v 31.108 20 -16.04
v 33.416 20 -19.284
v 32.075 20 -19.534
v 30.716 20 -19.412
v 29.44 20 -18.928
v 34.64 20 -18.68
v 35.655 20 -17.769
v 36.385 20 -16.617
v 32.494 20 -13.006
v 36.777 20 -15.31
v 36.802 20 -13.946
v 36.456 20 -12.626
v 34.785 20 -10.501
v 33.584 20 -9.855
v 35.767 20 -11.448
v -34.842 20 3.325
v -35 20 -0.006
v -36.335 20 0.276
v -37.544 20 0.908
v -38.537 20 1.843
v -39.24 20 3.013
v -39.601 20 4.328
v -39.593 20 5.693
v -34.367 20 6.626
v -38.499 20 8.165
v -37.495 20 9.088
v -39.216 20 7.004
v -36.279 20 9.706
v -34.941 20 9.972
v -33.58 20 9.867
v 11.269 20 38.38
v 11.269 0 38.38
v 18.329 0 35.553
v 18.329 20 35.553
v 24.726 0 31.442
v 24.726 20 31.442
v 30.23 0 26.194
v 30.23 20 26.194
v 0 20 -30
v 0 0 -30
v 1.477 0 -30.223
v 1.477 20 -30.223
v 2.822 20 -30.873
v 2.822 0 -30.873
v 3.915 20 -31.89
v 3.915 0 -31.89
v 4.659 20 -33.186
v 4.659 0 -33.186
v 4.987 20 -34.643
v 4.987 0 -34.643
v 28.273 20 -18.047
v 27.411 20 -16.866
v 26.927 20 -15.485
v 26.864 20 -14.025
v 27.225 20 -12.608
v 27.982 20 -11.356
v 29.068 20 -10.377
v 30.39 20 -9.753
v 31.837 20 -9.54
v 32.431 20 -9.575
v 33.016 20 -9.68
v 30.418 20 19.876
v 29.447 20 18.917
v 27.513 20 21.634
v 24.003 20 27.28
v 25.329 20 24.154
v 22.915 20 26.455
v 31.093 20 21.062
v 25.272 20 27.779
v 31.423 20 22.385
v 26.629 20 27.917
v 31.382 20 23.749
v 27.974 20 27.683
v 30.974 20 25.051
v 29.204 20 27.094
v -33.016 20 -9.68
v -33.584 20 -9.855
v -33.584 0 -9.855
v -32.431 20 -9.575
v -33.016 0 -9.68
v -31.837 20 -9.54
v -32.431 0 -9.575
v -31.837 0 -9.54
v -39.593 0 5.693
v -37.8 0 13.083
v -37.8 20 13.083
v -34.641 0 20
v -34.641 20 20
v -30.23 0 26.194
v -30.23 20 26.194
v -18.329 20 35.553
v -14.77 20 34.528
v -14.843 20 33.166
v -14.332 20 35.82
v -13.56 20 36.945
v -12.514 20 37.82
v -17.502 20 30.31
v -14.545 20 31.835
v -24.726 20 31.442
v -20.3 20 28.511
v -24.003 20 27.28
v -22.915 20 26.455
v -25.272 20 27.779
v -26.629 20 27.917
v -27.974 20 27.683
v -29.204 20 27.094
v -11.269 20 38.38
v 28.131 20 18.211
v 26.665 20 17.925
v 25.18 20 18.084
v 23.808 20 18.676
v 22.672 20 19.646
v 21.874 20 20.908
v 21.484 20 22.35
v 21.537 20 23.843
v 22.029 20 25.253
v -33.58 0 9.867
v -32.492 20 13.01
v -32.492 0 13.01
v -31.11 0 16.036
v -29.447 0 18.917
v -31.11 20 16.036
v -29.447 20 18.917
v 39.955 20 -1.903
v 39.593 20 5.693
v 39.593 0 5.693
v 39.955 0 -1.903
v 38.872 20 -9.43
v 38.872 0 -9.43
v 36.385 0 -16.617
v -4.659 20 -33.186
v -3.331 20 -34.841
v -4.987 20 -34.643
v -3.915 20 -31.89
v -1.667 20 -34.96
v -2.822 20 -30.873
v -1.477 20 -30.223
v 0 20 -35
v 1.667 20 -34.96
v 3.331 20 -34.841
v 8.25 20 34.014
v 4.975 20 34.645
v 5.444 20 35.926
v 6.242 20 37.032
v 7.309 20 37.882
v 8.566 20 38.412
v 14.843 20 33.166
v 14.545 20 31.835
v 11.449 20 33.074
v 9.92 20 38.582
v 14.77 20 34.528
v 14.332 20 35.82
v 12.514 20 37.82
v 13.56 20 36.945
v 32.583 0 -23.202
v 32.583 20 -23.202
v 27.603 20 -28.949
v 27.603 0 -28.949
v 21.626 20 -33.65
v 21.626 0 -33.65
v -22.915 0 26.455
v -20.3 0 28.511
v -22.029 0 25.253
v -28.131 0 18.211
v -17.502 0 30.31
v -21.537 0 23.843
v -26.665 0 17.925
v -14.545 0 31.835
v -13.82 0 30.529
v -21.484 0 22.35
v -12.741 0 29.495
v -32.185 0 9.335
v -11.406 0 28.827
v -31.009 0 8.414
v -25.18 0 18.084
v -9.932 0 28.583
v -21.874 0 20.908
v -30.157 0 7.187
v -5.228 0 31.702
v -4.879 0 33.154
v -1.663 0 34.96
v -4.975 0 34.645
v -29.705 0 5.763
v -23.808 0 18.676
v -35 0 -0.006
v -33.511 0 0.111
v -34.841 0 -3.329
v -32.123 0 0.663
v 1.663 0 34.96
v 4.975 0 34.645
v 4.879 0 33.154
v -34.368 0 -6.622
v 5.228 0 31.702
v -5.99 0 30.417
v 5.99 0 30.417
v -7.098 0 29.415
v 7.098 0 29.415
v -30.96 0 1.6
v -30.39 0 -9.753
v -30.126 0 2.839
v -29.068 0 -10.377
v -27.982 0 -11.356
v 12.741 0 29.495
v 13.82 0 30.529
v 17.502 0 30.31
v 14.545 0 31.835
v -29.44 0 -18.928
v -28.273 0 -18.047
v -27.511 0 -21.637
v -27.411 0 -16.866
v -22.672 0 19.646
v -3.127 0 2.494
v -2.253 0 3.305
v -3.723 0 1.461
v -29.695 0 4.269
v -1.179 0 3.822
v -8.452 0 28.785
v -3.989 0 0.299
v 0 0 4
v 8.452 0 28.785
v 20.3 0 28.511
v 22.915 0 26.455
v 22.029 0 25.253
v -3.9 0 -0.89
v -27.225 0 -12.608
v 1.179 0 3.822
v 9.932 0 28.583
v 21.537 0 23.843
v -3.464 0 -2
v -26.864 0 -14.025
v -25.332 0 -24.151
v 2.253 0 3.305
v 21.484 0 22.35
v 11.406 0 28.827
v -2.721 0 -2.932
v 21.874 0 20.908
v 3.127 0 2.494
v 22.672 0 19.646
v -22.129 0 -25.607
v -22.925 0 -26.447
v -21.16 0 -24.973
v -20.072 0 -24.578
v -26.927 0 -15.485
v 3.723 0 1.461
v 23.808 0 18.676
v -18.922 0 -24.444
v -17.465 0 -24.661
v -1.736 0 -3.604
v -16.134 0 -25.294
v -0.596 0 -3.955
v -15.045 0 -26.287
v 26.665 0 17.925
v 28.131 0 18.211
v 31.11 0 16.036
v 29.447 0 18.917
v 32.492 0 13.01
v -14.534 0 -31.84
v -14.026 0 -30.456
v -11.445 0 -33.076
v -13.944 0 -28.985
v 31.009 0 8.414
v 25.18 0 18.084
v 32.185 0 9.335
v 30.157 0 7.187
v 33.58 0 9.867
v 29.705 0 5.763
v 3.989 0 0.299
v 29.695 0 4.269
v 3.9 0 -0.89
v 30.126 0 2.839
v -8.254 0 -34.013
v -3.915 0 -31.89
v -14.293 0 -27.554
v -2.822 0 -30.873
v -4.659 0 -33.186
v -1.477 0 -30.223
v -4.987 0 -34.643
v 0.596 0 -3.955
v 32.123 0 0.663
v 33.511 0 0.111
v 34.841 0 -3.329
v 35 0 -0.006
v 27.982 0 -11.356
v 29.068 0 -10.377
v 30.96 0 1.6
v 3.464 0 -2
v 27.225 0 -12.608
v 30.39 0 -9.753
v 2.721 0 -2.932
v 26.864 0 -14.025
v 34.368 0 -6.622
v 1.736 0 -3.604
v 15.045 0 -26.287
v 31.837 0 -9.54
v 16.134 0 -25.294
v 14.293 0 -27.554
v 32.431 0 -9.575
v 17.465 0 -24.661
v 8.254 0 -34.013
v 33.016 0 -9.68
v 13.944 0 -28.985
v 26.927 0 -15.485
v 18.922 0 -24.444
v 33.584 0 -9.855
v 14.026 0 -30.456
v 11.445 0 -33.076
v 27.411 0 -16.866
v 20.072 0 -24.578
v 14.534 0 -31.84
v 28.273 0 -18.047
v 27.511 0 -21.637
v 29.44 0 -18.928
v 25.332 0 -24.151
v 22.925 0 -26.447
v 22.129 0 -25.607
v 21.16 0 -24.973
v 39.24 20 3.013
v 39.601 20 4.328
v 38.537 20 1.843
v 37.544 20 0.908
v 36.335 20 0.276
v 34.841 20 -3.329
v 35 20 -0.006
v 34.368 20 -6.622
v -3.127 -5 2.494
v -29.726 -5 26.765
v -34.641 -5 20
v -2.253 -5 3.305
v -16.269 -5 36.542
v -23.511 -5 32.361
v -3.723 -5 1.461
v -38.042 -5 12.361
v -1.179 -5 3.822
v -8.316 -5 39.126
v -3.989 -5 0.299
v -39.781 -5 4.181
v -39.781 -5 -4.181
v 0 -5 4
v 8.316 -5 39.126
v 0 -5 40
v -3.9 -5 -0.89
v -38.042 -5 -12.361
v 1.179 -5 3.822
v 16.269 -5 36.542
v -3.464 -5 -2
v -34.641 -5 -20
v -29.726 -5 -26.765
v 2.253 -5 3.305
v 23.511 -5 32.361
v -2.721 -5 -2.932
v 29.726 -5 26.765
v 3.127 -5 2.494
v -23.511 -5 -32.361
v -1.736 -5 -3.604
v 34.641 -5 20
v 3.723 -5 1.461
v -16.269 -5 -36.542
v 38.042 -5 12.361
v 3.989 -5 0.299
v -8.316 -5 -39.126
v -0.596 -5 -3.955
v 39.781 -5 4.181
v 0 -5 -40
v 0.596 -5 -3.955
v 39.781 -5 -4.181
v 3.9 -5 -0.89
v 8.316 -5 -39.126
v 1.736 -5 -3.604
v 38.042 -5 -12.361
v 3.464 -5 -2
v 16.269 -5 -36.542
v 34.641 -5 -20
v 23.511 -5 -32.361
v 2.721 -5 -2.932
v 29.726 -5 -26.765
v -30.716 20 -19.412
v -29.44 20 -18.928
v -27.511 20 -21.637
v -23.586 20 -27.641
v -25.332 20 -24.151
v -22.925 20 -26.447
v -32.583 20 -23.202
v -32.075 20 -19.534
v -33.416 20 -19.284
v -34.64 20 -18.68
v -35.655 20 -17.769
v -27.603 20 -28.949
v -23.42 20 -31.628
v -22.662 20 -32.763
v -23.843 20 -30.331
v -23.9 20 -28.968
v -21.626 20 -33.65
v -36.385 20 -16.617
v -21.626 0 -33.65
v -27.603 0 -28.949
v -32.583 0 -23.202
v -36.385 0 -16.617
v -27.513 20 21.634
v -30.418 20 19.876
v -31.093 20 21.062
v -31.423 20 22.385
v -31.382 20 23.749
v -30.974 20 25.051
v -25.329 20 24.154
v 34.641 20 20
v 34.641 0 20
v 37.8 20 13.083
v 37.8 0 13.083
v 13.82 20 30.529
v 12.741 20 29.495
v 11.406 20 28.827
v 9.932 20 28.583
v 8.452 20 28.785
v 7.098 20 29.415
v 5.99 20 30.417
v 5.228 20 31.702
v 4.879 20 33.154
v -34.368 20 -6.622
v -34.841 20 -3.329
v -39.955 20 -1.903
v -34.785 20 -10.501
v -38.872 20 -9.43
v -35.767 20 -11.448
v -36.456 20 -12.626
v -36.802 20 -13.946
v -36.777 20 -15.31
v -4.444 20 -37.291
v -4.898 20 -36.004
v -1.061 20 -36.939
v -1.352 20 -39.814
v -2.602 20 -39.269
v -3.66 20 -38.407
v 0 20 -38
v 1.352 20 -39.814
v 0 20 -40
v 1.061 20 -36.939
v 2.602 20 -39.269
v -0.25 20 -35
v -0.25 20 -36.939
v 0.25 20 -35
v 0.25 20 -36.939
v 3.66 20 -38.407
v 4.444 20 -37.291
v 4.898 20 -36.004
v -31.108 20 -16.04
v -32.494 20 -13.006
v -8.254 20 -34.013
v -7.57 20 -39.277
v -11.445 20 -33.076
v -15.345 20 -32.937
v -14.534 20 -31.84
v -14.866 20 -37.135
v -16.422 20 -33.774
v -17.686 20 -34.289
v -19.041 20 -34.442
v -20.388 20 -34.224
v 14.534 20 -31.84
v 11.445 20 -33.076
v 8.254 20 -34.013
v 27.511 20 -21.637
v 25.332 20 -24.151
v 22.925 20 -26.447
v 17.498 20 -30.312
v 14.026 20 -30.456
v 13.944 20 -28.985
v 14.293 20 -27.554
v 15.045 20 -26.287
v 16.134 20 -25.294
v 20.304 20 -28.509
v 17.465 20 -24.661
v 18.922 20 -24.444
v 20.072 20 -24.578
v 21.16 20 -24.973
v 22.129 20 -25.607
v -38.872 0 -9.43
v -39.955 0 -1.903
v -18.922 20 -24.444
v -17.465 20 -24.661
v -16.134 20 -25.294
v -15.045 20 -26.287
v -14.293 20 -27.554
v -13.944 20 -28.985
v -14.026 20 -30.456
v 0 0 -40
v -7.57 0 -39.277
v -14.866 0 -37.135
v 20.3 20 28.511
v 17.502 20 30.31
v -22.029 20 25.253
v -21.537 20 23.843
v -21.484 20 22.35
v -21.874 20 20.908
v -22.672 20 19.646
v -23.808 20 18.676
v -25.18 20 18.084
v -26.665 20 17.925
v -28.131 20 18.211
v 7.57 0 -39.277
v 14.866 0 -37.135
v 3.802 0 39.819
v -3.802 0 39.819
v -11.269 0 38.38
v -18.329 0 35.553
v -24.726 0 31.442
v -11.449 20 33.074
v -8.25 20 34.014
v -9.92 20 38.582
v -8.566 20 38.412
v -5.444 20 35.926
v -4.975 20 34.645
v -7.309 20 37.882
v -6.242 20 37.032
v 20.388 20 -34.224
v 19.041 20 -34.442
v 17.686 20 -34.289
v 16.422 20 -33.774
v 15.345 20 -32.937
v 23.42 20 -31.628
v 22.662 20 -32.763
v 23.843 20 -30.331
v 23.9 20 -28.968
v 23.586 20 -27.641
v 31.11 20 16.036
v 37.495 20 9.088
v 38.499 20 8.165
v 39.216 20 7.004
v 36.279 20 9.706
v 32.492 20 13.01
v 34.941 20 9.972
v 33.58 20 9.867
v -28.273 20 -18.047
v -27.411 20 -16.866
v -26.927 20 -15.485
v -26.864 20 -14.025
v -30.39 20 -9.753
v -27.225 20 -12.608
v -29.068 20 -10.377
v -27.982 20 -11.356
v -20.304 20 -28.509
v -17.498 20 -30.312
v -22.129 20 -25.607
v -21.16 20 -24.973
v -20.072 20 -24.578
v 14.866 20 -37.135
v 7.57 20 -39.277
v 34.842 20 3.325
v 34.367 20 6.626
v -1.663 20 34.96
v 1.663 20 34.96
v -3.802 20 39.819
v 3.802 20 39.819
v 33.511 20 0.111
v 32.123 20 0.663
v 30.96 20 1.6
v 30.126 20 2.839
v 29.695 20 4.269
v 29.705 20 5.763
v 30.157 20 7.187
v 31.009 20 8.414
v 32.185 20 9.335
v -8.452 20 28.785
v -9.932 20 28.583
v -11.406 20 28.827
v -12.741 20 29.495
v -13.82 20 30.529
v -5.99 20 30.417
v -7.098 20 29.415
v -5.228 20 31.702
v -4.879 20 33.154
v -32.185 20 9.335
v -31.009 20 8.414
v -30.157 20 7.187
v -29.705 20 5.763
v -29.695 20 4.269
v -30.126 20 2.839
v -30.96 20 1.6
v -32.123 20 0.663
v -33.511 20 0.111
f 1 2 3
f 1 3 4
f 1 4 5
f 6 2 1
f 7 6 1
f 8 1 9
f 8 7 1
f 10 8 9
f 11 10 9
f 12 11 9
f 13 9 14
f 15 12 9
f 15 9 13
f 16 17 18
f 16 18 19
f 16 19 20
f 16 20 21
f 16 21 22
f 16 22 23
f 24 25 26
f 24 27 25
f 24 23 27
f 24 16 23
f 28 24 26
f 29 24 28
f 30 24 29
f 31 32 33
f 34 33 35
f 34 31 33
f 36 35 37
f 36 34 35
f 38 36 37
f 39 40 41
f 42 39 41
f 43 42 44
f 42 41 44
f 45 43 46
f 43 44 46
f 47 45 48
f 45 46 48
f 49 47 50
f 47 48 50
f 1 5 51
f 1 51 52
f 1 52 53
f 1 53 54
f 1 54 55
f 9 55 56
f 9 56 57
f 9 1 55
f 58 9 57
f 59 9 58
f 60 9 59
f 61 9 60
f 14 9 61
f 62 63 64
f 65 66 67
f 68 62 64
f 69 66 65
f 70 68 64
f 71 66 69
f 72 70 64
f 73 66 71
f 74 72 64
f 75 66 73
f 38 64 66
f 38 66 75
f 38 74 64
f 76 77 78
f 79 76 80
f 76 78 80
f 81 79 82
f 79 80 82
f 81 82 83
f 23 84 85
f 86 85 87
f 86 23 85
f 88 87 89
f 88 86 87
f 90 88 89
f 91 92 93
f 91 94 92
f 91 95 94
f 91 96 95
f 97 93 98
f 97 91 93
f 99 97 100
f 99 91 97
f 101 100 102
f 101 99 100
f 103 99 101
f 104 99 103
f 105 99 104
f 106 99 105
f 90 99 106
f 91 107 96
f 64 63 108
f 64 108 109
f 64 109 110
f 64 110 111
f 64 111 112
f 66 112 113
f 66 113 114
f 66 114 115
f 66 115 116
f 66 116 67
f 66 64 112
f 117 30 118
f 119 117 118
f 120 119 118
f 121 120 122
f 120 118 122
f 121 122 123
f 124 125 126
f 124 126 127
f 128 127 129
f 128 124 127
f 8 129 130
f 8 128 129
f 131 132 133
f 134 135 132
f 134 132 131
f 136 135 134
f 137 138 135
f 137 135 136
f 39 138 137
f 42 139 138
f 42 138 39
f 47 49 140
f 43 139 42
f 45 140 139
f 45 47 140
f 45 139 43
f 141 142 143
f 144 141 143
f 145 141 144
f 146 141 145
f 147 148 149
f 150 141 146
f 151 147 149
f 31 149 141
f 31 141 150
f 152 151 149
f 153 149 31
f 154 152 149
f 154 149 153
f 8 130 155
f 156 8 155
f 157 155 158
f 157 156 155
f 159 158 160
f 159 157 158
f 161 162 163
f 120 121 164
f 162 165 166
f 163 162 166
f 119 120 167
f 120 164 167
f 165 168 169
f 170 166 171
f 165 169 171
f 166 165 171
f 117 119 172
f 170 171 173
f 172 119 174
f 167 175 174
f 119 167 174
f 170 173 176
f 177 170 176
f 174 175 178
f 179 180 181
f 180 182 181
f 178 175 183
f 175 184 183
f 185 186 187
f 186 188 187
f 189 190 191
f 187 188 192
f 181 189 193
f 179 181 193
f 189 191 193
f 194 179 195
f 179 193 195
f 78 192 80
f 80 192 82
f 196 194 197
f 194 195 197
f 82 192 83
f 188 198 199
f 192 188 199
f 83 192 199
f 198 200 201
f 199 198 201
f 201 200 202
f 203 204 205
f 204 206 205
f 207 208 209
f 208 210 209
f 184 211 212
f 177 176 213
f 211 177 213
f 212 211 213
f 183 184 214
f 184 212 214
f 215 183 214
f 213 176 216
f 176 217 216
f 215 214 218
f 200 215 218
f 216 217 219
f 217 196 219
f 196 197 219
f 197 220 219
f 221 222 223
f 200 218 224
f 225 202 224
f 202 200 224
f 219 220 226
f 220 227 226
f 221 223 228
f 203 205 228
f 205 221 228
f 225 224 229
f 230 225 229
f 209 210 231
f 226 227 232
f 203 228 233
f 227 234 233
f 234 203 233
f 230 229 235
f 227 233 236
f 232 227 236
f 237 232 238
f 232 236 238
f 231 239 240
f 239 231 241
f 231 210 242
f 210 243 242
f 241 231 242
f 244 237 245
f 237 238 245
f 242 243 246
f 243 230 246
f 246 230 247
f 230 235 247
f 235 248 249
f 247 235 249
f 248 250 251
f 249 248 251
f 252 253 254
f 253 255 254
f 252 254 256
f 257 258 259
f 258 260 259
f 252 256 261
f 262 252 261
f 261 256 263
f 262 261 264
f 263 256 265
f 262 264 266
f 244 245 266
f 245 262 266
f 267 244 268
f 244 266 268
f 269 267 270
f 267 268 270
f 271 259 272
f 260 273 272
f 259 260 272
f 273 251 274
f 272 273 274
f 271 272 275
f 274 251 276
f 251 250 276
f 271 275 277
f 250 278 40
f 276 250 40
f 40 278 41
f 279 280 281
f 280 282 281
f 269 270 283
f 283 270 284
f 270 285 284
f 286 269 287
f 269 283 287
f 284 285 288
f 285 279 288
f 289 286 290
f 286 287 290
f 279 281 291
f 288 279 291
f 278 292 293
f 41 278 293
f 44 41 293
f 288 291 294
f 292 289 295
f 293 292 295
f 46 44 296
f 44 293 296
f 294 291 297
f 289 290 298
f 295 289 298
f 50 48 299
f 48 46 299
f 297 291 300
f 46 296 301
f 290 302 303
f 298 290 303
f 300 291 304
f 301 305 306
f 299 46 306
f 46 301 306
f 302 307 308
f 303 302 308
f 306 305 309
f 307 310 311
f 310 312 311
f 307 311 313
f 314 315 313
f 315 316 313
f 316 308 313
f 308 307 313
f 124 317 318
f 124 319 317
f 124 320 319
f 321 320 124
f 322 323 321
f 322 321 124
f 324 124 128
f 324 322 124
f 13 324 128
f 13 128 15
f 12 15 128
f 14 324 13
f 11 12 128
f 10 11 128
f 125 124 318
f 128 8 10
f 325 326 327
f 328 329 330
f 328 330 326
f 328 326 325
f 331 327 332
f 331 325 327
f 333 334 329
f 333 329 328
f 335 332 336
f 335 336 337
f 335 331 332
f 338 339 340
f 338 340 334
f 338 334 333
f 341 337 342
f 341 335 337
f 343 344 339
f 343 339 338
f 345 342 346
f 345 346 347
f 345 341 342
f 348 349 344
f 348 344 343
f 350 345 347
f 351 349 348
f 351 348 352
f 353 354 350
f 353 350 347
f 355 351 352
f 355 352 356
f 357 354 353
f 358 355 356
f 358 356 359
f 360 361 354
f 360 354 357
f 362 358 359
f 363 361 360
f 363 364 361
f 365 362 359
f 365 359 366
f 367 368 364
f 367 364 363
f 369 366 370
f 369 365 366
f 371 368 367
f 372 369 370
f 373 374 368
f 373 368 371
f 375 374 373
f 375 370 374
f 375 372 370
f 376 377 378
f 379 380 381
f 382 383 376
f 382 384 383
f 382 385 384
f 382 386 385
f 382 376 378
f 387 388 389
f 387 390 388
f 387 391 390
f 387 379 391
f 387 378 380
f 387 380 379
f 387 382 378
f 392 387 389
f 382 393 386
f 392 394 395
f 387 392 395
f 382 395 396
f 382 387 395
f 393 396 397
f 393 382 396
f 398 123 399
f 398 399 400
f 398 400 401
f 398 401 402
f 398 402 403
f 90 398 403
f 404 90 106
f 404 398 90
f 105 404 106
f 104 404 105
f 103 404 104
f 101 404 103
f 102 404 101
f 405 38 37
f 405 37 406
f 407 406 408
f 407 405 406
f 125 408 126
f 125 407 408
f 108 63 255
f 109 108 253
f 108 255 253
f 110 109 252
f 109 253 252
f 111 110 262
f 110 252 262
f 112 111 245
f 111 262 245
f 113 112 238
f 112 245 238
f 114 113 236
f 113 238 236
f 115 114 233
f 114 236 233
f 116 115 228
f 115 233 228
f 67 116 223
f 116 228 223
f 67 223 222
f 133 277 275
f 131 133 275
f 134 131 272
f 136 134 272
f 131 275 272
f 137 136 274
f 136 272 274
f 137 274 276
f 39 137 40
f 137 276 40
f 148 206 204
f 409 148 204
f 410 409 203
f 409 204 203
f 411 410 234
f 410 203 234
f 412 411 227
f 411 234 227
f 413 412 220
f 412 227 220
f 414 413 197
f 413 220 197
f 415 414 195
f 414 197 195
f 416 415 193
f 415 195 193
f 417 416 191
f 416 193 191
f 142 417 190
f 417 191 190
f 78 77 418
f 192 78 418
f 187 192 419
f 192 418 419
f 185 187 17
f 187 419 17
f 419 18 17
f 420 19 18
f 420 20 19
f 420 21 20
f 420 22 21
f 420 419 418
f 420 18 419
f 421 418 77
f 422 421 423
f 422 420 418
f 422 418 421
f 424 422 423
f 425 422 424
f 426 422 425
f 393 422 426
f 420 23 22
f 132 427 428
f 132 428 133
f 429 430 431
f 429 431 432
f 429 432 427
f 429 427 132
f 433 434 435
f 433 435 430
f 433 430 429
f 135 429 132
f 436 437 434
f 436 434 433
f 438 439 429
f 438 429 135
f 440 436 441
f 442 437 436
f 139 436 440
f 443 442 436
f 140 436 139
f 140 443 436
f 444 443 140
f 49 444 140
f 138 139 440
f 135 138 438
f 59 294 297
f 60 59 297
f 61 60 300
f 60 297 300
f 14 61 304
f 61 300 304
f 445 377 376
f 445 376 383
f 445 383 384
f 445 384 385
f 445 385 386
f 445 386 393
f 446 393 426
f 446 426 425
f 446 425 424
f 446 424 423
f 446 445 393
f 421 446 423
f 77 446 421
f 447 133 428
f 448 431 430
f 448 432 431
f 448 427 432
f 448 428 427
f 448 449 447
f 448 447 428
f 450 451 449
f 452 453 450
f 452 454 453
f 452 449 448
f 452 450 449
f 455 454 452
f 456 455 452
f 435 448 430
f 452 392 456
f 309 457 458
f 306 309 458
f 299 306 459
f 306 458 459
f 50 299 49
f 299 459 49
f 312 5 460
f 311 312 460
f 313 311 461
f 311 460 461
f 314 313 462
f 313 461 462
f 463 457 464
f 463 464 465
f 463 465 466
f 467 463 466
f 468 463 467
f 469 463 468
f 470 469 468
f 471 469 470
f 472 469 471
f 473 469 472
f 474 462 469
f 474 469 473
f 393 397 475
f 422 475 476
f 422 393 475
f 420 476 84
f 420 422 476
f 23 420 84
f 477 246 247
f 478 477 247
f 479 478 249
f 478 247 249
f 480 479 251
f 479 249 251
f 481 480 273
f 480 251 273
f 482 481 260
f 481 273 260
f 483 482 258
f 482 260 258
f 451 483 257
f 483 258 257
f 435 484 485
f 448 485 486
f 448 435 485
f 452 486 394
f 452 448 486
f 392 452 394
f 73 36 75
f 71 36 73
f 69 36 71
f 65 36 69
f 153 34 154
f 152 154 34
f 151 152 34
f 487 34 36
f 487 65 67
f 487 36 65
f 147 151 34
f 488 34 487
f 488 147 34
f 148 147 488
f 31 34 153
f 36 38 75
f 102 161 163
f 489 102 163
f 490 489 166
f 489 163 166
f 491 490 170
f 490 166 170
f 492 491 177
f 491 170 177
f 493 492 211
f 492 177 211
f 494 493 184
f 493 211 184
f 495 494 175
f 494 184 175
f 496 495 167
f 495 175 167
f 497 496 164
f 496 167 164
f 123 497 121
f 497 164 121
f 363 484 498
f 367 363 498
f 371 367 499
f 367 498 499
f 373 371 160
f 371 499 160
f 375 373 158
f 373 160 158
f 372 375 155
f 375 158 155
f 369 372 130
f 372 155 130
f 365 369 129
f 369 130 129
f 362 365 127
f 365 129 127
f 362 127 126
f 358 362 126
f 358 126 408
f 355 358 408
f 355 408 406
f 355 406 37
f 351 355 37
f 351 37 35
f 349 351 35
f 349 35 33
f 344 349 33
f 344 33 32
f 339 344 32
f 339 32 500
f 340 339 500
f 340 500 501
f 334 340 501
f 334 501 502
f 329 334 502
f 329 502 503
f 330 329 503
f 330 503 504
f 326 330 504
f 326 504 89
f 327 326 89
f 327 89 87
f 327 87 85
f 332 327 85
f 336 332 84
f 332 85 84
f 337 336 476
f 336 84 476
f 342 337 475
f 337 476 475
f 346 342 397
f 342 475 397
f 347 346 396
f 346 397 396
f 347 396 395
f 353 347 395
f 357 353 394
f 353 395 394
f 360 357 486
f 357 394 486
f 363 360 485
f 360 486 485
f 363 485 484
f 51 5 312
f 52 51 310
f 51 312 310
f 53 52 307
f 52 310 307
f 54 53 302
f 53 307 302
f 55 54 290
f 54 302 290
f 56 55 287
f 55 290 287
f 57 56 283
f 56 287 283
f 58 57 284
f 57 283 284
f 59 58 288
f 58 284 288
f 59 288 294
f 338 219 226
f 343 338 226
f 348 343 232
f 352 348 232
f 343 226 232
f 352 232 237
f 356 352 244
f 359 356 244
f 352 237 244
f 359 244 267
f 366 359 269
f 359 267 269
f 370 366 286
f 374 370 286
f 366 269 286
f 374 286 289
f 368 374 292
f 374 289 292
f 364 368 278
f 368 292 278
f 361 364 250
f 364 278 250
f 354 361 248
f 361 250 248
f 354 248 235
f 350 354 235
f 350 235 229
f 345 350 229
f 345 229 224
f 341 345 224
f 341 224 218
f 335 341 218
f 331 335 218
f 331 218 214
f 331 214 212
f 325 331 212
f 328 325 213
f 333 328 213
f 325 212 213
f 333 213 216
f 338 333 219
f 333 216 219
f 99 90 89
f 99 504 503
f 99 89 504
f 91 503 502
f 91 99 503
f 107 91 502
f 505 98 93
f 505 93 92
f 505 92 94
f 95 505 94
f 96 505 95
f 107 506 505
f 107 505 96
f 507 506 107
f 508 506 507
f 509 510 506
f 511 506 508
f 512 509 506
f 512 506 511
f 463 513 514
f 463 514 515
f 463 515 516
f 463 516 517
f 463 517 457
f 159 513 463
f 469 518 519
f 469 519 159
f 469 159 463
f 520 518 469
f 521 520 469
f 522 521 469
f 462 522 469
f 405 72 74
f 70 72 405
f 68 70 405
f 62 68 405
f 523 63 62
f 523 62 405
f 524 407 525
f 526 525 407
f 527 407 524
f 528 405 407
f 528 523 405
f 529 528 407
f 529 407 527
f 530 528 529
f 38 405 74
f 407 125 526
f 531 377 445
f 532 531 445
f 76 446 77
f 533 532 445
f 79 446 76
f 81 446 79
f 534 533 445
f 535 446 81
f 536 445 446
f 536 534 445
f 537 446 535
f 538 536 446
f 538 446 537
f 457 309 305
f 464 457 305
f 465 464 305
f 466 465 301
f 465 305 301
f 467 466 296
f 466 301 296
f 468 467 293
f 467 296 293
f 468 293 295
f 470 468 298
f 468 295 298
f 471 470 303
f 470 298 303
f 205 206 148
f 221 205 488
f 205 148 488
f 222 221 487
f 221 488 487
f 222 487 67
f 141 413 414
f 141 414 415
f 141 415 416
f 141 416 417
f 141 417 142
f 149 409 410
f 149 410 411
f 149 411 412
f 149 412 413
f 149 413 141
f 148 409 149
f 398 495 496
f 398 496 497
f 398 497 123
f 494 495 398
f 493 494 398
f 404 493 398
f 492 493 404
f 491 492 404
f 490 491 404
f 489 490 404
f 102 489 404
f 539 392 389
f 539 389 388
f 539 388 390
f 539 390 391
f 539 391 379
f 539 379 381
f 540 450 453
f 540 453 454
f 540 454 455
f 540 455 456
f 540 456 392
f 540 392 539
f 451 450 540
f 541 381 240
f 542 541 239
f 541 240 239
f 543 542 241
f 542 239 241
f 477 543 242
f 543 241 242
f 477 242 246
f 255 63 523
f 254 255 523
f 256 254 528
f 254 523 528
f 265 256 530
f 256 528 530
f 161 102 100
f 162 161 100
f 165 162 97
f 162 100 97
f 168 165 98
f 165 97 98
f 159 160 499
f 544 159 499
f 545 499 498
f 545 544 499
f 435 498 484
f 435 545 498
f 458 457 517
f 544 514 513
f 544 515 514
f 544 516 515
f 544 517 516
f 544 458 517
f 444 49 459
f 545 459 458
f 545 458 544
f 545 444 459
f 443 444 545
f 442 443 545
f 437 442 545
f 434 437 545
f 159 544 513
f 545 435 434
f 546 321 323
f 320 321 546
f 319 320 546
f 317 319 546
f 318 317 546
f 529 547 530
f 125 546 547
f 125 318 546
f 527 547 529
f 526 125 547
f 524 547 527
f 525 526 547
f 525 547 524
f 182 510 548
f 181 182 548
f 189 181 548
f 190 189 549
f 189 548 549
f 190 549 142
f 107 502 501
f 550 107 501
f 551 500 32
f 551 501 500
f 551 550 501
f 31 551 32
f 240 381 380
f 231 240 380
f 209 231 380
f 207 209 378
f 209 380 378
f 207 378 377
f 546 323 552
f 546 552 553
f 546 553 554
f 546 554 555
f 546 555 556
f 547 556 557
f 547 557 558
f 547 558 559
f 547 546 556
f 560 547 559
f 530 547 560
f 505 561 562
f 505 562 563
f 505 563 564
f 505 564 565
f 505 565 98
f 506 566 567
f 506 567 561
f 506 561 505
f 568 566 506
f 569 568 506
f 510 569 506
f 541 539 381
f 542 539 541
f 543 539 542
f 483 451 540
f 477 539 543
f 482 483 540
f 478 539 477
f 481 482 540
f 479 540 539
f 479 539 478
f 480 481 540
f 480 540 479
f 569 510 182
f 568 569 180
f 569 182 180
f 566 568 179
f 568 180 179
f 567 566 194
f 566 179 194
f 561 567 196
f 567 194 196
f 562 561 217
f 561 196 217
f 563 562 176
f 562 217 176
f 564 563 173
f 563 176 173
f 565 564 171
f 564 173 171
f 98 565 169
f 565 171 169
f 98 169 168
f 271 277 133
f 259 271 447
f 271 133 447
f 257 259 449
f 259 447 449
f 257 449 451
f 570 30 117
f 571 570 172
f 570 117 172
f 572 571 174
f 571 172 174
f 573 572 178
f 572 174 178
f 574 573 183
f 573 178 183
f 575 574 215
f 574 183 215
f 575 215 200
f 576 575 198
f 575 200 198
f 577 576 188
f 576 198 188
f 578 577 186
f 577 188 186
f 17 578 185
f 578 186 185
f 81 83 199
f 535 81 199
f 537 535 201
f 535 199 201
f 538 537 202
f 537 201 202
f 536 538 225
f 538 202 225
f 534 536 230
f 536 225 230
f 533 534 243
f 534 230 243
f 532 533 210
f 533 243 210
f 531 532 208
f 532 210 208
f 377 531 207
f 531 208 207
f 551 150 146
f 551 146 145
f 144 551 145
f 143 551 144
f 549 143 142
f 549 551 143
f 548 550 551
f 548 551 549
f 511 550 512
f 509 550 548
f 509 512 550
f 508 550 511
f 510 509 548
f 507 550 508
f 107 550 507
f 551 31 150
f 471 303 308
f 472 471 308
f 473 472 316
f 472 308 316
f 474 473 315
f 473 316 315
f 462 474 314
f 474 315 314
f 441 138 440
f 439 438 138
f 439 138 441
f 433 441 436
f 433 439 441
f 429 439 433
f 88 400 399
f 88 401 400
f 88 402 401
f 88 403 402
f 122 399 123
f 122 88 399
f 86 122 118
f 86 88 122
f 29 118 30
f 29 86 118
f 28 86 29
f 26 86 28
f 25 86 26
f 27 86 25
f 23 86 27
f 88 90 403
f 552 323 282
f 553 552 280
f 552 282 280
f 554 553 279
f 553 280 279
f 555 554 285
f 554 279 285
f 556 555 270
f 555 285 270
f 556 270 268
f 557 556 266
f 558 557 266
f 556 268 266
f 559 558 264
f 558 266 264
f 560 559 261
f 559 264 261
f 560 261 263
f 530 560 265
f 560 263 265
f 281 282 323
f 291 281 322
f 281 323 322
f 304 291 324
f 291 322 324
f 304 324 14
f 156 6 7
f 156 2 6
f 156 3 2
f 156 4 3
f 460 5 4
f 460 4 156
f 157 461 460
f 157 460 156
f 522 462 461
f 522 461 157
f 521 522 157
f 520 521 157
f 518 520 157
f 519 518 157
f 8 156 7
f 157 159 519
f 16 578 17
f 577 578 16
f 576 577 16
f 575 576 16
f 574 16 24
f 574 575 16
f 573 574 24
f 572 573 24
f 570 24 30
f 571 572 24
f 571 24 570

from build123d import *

# Parameters (mm, degrees)
SKETCH1_R              = 5
BOSS_EXTRUDE1_DEPTH    = 20
BOSS_EXTRUDE1_2_DEPTH  = 20
BOSS_EXTRUDE1_3_DEPTH  = 20
BOSS_EXTRUDE1_4_DEPTH  = 20
BOSS_EXTRUDE1_5_DEPTH  = 20
BOSS_EXTRUDE1_6_DEPTH  = 20
BOSS_EXTRUDE1_7_DEPTH  = 20
BOSS_EXTRUDE1_8_DEPTH  = 20
BOSS_EXTRUDE1_9_DEPTH  = 20
BOSS_EXTRUDE1_10_DEPTH = 20
BOSS_EXTRUDE1_11_DEPTH = 20
SKETCH2_R              = 35
SKETCH2_R_2            = 4
BOSS_EXTRUDE2_DEPTH    = 5
SKETCH3_W              = 0.25
SKETCH3_H              = 1.939339828
CUT_EXTRUDE1_DEPTH     = 0.1
BOSS_EXTRUDE4_START    = -5
SKETCH4_R              = 40
SKETCH4_R_2            = 35
BOSS_EXTRUDE4_DEPTH    = 5
BOSS_EXTRUDE5_START    = 20
SKETCH5_R              = 40
SKETCH5_R_2            = 35
BOSS_EXTRUDE5_DEPTH    = 20


with BuildPart() as part:
    # Sketch1 → Boss-Extrude1 (new body)
    with BuildSketch(Plane(origin=(0, 0, 0), x_dir=(1, 0, 0), z_dir=(0, 1, 0))):
        with Locations(Location((0, 35, 0), (0, 0, 270))):
            Circle(SKETCH1_R)
    extrude(amount=BOSS_EXTRUDE1_DEPTH)



with BuildPart() as body_2:
    # Sketch1 → Boss-Extrude1 2 (new body)
    with BuildSketch(Plane(origin=(0, 0, 0), x_dir=(1, 0, 0), z_dir=(0, 1, 0))):
        with Locations(Location((18.922428611, 29.443873649, 0), (0, 0, 270))):
            Circle(SKETCH1_R)
    extrude(amount=BOSS_EXTRUDE1_2_DEPTH)


with BuildPart() as body_3:
    # Sketch1 → Boss-Extrude1 3 (new body)
    with BuildSketch(Plane(origin=(0, 0, 0), x_dir=(1, 0, 0), z_dir=(0, 1, 0))):
        with Locations(Location((31.837119837, 14.539525455, 0), (0, 0, 270))):
            Circle(SKETCH1_R)
    extrude(amount=BOSS_EXTRUDE1_3_DEPTH)


with BuildPart() as body_4:
    # Sketch1 → Boss-Extrude1 4 (new body)
    with BuildSketch(Plane(origin=(0, 0, 0), x_dir=(1, 0, 0), z_dir=(0, 1, 0))):
        with Locations(Location((34.643750466, -4.98101934, 0), (0, 0, 270))):
            Circle(SKETCH1_R)
    extrude(amount=BOSS_EXTRUDE1_4_DEPTH)


with BuildPart() as body_5:
    # Sketch1 → Boss-Extrude1 5 (new body)
    with BuildSketch(Plane(origin=(0, 0, 0), x_dir=(1, 0, 0), z_dir=(0, 1, 0))):
        with Locations(Location((26.451235102, -22.920125688, 0), (0, 0, 270))):
            Circle(SKETCH1_R)
    extrude(amount=BOSS_EXTRUDE1_5_DEPTH)


with BuildPart() as body_6:
    # Sketch1 → Boss-Extrude1 6 (new body)
    with BuildSketch(Plane(origin=(0, 0, 0), x_dir=(1, 0, 0), z_dir=(0, 1, 0))):
        with Locations(Location((9.860639489, -33.582254077, 0), (0, 0, 270))):
            Circle(SKETCH1_R)
    extrude(amount=BOSS_EXTRUDE1_6_DEPTH)


with BuildPart() as body_7:
    # Sketch1 → Boss-Extrude1 7 (new body)
    with BuildSketch(Plane(origin=(0, 0, 0), x_dir=(1, 0, 0), z_dir=(0, 1, 0))):
        with Locations(Location((-9.860639489, -33.582254077, 0), (0, 0, 270))):
            Circle(SKETCH1_R)
    extrude(amount=BOSS_EXTRUDE1_7_DEPTH)


with BuildPart() as body_8:
    # Sketch1 → Boss-Extrude1 8 (new body)
    with BuildSketch(Plane(origin=(0, 0, 0), x_dir=(1, 0, 0), z_dir=(0, 1, 0))):
        with Locations(Location((-26.451235102, -22.920125688, 0), (0, 0, 270))):
            Circle(SKETCH1_R)
    extrude(amount=BOSS_EXTRUDE1_8_DEPTH)


with BuildPart() as body_9:
    # Sketch1 → Boss-Extrude1 9 (new body)
    with BuildSketch(Plane(origin=(0, 0, 0), x_dir=(1, 0, 0), z_dir=(0, 1, 0))):
        with Locations(Location((-34.643750466, -4.98101934, 0), (0, 0, 270))):
            Circle(SKETCH1_R)
    extrude(amount=BOSS_EXTRUDE1_9_DEPTH)


with BuildPart() as body_10:
    # Sketch1 → Boss-Extrude1 10 (new body)
    with BuildSketch(Plane(origin=(0, 0, 0), x_dir=(1, 0, 0), z_dir=(0, 1, 0))):
        with Locations(Location((-31.837119837, 14.539525455, 0), (0, 0, 270))):
            Circle(SKETCH1_R)
    extrude(amount=BOSS_EXTRUDE1_10_DEPTH)


with BuildPart() as body_11:
    # Sketch1 → Boss-Extrude1 11 (new body)
    with BuildSketch(Plane(origin=(0, 0, 0), x_dir=(1, 0, 0), z_dir=(0, 1, 0))):
        with Locations(Location((-18.922428611, 29.443873649, 0), (0, 0, 270))):
            Circle(SKETCH1_R)
    extrude(amount=BOSS_EXTRUDE1_11_DEPTH)


with BuildPart() as part_1:
    add(part.part)

    add(body_2.part)  # Boss-Extrude2 merges body 2

    add(body_3.part)  # Boss-Extrude2 merges body 3

    add(body_4.part)  # Boss-Extrude2 merges body 4

    add(body_5.part)  # Boss-Extrude2 merges body 5

    add(body_6.part)  # Boss-Extrude2 merges body 6

    add(body_7.part)  # Boss-Extrude2 merges body 7

    add(body_8.part)  # Boss-Extrude2 merges body 8

    add(body_9.part)  # Boss-Extrude2 merges body 9

    add(body_10.part)  # Boss-Extrude2 merges body 10

    add(body_11.part)  # Boss-Extrude2 merges body 11
    # Sketch2 → Boss-Extrude2 (add)
    with BuildSketch(Plane(origin=(0, 0, 0), x_dir=(1, 0, 0), z_dir=(0, 1, 0))):
        with Locations(Location((0, 0, 0), (0, 0, 270))):
            Circle(SKETCH2_R)
        with Locations(Location((0, 0, 0), (0, 0, 270))):
            Circle(SKETCH2_R_2, mode=Mode.SUBTRACT)
    extrude(amount=-BOSS_EXTRUDE2_DEPTH)

    # Sketch3 → Cut-Extrude1 (cut)
    with BuildSketch(Plane(origin=(0, 20, 0), x_dir=(1, 0, 0), z_dir=(0, 1, 0))):
        Polygon((-1.060660172, 36.939339828), (-0.25, 36.939339828), (-0.25, 37.75), align=None)
        Polygon((-0.25, 36.939339828), (0, 36.939339828), (0, 38), (-0.25, 37.75), align=None)
        Polygon((0, 38), (0, 36.939339828), (0.25, 36.939339828), (0.25, 37.75), align=None)
        Polygon((0.25, 37.75), (0.25, 36.939339828), (1.060660172, 36.939339828), align=None)
        with Locations((0.125, 35.969669914)):
            Rectangle(SKETCH3_W, SKETCH3_H)
        with Locations((-0.125, 35.969669914)):
            Rectangle(SKETCH3_W, SKETCH3_H)
    extrude(amount=-CUT_EXTRUDE1_DEPTH, mode=Mode.SUBTRACT)

    # Sketch4 → Boss-Extrude4 (add)
    with BuildSketch(Plane.XZ.offset(5).offset(BOSS_EXTRUDE4_START)):
        with Locations(Location((0, 0, 0), (0, 0, 270))):
            Circle(SKETCH4_R)
        Circle(SKETCH4_R_2, mode=Mode.SUBTRACT)
    extrude(amount=BOSS_EXTRUDE4_DEPTH)

    # Sketch5 → Boss-Extrude5 (add)
    with BuildSketch(Plane(origin=(0, 0, 0), x_dir=(1, 0, 0), z_dir=(0, 1, 0)).offset(BOSS_EXTRUDE5_START)):
        with Locations(Location((0, 0, 0), (0, 0, 90))):
            Circle(SKETCH5_R)
        Circle(SKETCH5_R_2, mode=Mode.SUBTRACT)
    extrude(amount=-BOSS_EXTRUDE5_DEPTH)


solid = part_1.part
